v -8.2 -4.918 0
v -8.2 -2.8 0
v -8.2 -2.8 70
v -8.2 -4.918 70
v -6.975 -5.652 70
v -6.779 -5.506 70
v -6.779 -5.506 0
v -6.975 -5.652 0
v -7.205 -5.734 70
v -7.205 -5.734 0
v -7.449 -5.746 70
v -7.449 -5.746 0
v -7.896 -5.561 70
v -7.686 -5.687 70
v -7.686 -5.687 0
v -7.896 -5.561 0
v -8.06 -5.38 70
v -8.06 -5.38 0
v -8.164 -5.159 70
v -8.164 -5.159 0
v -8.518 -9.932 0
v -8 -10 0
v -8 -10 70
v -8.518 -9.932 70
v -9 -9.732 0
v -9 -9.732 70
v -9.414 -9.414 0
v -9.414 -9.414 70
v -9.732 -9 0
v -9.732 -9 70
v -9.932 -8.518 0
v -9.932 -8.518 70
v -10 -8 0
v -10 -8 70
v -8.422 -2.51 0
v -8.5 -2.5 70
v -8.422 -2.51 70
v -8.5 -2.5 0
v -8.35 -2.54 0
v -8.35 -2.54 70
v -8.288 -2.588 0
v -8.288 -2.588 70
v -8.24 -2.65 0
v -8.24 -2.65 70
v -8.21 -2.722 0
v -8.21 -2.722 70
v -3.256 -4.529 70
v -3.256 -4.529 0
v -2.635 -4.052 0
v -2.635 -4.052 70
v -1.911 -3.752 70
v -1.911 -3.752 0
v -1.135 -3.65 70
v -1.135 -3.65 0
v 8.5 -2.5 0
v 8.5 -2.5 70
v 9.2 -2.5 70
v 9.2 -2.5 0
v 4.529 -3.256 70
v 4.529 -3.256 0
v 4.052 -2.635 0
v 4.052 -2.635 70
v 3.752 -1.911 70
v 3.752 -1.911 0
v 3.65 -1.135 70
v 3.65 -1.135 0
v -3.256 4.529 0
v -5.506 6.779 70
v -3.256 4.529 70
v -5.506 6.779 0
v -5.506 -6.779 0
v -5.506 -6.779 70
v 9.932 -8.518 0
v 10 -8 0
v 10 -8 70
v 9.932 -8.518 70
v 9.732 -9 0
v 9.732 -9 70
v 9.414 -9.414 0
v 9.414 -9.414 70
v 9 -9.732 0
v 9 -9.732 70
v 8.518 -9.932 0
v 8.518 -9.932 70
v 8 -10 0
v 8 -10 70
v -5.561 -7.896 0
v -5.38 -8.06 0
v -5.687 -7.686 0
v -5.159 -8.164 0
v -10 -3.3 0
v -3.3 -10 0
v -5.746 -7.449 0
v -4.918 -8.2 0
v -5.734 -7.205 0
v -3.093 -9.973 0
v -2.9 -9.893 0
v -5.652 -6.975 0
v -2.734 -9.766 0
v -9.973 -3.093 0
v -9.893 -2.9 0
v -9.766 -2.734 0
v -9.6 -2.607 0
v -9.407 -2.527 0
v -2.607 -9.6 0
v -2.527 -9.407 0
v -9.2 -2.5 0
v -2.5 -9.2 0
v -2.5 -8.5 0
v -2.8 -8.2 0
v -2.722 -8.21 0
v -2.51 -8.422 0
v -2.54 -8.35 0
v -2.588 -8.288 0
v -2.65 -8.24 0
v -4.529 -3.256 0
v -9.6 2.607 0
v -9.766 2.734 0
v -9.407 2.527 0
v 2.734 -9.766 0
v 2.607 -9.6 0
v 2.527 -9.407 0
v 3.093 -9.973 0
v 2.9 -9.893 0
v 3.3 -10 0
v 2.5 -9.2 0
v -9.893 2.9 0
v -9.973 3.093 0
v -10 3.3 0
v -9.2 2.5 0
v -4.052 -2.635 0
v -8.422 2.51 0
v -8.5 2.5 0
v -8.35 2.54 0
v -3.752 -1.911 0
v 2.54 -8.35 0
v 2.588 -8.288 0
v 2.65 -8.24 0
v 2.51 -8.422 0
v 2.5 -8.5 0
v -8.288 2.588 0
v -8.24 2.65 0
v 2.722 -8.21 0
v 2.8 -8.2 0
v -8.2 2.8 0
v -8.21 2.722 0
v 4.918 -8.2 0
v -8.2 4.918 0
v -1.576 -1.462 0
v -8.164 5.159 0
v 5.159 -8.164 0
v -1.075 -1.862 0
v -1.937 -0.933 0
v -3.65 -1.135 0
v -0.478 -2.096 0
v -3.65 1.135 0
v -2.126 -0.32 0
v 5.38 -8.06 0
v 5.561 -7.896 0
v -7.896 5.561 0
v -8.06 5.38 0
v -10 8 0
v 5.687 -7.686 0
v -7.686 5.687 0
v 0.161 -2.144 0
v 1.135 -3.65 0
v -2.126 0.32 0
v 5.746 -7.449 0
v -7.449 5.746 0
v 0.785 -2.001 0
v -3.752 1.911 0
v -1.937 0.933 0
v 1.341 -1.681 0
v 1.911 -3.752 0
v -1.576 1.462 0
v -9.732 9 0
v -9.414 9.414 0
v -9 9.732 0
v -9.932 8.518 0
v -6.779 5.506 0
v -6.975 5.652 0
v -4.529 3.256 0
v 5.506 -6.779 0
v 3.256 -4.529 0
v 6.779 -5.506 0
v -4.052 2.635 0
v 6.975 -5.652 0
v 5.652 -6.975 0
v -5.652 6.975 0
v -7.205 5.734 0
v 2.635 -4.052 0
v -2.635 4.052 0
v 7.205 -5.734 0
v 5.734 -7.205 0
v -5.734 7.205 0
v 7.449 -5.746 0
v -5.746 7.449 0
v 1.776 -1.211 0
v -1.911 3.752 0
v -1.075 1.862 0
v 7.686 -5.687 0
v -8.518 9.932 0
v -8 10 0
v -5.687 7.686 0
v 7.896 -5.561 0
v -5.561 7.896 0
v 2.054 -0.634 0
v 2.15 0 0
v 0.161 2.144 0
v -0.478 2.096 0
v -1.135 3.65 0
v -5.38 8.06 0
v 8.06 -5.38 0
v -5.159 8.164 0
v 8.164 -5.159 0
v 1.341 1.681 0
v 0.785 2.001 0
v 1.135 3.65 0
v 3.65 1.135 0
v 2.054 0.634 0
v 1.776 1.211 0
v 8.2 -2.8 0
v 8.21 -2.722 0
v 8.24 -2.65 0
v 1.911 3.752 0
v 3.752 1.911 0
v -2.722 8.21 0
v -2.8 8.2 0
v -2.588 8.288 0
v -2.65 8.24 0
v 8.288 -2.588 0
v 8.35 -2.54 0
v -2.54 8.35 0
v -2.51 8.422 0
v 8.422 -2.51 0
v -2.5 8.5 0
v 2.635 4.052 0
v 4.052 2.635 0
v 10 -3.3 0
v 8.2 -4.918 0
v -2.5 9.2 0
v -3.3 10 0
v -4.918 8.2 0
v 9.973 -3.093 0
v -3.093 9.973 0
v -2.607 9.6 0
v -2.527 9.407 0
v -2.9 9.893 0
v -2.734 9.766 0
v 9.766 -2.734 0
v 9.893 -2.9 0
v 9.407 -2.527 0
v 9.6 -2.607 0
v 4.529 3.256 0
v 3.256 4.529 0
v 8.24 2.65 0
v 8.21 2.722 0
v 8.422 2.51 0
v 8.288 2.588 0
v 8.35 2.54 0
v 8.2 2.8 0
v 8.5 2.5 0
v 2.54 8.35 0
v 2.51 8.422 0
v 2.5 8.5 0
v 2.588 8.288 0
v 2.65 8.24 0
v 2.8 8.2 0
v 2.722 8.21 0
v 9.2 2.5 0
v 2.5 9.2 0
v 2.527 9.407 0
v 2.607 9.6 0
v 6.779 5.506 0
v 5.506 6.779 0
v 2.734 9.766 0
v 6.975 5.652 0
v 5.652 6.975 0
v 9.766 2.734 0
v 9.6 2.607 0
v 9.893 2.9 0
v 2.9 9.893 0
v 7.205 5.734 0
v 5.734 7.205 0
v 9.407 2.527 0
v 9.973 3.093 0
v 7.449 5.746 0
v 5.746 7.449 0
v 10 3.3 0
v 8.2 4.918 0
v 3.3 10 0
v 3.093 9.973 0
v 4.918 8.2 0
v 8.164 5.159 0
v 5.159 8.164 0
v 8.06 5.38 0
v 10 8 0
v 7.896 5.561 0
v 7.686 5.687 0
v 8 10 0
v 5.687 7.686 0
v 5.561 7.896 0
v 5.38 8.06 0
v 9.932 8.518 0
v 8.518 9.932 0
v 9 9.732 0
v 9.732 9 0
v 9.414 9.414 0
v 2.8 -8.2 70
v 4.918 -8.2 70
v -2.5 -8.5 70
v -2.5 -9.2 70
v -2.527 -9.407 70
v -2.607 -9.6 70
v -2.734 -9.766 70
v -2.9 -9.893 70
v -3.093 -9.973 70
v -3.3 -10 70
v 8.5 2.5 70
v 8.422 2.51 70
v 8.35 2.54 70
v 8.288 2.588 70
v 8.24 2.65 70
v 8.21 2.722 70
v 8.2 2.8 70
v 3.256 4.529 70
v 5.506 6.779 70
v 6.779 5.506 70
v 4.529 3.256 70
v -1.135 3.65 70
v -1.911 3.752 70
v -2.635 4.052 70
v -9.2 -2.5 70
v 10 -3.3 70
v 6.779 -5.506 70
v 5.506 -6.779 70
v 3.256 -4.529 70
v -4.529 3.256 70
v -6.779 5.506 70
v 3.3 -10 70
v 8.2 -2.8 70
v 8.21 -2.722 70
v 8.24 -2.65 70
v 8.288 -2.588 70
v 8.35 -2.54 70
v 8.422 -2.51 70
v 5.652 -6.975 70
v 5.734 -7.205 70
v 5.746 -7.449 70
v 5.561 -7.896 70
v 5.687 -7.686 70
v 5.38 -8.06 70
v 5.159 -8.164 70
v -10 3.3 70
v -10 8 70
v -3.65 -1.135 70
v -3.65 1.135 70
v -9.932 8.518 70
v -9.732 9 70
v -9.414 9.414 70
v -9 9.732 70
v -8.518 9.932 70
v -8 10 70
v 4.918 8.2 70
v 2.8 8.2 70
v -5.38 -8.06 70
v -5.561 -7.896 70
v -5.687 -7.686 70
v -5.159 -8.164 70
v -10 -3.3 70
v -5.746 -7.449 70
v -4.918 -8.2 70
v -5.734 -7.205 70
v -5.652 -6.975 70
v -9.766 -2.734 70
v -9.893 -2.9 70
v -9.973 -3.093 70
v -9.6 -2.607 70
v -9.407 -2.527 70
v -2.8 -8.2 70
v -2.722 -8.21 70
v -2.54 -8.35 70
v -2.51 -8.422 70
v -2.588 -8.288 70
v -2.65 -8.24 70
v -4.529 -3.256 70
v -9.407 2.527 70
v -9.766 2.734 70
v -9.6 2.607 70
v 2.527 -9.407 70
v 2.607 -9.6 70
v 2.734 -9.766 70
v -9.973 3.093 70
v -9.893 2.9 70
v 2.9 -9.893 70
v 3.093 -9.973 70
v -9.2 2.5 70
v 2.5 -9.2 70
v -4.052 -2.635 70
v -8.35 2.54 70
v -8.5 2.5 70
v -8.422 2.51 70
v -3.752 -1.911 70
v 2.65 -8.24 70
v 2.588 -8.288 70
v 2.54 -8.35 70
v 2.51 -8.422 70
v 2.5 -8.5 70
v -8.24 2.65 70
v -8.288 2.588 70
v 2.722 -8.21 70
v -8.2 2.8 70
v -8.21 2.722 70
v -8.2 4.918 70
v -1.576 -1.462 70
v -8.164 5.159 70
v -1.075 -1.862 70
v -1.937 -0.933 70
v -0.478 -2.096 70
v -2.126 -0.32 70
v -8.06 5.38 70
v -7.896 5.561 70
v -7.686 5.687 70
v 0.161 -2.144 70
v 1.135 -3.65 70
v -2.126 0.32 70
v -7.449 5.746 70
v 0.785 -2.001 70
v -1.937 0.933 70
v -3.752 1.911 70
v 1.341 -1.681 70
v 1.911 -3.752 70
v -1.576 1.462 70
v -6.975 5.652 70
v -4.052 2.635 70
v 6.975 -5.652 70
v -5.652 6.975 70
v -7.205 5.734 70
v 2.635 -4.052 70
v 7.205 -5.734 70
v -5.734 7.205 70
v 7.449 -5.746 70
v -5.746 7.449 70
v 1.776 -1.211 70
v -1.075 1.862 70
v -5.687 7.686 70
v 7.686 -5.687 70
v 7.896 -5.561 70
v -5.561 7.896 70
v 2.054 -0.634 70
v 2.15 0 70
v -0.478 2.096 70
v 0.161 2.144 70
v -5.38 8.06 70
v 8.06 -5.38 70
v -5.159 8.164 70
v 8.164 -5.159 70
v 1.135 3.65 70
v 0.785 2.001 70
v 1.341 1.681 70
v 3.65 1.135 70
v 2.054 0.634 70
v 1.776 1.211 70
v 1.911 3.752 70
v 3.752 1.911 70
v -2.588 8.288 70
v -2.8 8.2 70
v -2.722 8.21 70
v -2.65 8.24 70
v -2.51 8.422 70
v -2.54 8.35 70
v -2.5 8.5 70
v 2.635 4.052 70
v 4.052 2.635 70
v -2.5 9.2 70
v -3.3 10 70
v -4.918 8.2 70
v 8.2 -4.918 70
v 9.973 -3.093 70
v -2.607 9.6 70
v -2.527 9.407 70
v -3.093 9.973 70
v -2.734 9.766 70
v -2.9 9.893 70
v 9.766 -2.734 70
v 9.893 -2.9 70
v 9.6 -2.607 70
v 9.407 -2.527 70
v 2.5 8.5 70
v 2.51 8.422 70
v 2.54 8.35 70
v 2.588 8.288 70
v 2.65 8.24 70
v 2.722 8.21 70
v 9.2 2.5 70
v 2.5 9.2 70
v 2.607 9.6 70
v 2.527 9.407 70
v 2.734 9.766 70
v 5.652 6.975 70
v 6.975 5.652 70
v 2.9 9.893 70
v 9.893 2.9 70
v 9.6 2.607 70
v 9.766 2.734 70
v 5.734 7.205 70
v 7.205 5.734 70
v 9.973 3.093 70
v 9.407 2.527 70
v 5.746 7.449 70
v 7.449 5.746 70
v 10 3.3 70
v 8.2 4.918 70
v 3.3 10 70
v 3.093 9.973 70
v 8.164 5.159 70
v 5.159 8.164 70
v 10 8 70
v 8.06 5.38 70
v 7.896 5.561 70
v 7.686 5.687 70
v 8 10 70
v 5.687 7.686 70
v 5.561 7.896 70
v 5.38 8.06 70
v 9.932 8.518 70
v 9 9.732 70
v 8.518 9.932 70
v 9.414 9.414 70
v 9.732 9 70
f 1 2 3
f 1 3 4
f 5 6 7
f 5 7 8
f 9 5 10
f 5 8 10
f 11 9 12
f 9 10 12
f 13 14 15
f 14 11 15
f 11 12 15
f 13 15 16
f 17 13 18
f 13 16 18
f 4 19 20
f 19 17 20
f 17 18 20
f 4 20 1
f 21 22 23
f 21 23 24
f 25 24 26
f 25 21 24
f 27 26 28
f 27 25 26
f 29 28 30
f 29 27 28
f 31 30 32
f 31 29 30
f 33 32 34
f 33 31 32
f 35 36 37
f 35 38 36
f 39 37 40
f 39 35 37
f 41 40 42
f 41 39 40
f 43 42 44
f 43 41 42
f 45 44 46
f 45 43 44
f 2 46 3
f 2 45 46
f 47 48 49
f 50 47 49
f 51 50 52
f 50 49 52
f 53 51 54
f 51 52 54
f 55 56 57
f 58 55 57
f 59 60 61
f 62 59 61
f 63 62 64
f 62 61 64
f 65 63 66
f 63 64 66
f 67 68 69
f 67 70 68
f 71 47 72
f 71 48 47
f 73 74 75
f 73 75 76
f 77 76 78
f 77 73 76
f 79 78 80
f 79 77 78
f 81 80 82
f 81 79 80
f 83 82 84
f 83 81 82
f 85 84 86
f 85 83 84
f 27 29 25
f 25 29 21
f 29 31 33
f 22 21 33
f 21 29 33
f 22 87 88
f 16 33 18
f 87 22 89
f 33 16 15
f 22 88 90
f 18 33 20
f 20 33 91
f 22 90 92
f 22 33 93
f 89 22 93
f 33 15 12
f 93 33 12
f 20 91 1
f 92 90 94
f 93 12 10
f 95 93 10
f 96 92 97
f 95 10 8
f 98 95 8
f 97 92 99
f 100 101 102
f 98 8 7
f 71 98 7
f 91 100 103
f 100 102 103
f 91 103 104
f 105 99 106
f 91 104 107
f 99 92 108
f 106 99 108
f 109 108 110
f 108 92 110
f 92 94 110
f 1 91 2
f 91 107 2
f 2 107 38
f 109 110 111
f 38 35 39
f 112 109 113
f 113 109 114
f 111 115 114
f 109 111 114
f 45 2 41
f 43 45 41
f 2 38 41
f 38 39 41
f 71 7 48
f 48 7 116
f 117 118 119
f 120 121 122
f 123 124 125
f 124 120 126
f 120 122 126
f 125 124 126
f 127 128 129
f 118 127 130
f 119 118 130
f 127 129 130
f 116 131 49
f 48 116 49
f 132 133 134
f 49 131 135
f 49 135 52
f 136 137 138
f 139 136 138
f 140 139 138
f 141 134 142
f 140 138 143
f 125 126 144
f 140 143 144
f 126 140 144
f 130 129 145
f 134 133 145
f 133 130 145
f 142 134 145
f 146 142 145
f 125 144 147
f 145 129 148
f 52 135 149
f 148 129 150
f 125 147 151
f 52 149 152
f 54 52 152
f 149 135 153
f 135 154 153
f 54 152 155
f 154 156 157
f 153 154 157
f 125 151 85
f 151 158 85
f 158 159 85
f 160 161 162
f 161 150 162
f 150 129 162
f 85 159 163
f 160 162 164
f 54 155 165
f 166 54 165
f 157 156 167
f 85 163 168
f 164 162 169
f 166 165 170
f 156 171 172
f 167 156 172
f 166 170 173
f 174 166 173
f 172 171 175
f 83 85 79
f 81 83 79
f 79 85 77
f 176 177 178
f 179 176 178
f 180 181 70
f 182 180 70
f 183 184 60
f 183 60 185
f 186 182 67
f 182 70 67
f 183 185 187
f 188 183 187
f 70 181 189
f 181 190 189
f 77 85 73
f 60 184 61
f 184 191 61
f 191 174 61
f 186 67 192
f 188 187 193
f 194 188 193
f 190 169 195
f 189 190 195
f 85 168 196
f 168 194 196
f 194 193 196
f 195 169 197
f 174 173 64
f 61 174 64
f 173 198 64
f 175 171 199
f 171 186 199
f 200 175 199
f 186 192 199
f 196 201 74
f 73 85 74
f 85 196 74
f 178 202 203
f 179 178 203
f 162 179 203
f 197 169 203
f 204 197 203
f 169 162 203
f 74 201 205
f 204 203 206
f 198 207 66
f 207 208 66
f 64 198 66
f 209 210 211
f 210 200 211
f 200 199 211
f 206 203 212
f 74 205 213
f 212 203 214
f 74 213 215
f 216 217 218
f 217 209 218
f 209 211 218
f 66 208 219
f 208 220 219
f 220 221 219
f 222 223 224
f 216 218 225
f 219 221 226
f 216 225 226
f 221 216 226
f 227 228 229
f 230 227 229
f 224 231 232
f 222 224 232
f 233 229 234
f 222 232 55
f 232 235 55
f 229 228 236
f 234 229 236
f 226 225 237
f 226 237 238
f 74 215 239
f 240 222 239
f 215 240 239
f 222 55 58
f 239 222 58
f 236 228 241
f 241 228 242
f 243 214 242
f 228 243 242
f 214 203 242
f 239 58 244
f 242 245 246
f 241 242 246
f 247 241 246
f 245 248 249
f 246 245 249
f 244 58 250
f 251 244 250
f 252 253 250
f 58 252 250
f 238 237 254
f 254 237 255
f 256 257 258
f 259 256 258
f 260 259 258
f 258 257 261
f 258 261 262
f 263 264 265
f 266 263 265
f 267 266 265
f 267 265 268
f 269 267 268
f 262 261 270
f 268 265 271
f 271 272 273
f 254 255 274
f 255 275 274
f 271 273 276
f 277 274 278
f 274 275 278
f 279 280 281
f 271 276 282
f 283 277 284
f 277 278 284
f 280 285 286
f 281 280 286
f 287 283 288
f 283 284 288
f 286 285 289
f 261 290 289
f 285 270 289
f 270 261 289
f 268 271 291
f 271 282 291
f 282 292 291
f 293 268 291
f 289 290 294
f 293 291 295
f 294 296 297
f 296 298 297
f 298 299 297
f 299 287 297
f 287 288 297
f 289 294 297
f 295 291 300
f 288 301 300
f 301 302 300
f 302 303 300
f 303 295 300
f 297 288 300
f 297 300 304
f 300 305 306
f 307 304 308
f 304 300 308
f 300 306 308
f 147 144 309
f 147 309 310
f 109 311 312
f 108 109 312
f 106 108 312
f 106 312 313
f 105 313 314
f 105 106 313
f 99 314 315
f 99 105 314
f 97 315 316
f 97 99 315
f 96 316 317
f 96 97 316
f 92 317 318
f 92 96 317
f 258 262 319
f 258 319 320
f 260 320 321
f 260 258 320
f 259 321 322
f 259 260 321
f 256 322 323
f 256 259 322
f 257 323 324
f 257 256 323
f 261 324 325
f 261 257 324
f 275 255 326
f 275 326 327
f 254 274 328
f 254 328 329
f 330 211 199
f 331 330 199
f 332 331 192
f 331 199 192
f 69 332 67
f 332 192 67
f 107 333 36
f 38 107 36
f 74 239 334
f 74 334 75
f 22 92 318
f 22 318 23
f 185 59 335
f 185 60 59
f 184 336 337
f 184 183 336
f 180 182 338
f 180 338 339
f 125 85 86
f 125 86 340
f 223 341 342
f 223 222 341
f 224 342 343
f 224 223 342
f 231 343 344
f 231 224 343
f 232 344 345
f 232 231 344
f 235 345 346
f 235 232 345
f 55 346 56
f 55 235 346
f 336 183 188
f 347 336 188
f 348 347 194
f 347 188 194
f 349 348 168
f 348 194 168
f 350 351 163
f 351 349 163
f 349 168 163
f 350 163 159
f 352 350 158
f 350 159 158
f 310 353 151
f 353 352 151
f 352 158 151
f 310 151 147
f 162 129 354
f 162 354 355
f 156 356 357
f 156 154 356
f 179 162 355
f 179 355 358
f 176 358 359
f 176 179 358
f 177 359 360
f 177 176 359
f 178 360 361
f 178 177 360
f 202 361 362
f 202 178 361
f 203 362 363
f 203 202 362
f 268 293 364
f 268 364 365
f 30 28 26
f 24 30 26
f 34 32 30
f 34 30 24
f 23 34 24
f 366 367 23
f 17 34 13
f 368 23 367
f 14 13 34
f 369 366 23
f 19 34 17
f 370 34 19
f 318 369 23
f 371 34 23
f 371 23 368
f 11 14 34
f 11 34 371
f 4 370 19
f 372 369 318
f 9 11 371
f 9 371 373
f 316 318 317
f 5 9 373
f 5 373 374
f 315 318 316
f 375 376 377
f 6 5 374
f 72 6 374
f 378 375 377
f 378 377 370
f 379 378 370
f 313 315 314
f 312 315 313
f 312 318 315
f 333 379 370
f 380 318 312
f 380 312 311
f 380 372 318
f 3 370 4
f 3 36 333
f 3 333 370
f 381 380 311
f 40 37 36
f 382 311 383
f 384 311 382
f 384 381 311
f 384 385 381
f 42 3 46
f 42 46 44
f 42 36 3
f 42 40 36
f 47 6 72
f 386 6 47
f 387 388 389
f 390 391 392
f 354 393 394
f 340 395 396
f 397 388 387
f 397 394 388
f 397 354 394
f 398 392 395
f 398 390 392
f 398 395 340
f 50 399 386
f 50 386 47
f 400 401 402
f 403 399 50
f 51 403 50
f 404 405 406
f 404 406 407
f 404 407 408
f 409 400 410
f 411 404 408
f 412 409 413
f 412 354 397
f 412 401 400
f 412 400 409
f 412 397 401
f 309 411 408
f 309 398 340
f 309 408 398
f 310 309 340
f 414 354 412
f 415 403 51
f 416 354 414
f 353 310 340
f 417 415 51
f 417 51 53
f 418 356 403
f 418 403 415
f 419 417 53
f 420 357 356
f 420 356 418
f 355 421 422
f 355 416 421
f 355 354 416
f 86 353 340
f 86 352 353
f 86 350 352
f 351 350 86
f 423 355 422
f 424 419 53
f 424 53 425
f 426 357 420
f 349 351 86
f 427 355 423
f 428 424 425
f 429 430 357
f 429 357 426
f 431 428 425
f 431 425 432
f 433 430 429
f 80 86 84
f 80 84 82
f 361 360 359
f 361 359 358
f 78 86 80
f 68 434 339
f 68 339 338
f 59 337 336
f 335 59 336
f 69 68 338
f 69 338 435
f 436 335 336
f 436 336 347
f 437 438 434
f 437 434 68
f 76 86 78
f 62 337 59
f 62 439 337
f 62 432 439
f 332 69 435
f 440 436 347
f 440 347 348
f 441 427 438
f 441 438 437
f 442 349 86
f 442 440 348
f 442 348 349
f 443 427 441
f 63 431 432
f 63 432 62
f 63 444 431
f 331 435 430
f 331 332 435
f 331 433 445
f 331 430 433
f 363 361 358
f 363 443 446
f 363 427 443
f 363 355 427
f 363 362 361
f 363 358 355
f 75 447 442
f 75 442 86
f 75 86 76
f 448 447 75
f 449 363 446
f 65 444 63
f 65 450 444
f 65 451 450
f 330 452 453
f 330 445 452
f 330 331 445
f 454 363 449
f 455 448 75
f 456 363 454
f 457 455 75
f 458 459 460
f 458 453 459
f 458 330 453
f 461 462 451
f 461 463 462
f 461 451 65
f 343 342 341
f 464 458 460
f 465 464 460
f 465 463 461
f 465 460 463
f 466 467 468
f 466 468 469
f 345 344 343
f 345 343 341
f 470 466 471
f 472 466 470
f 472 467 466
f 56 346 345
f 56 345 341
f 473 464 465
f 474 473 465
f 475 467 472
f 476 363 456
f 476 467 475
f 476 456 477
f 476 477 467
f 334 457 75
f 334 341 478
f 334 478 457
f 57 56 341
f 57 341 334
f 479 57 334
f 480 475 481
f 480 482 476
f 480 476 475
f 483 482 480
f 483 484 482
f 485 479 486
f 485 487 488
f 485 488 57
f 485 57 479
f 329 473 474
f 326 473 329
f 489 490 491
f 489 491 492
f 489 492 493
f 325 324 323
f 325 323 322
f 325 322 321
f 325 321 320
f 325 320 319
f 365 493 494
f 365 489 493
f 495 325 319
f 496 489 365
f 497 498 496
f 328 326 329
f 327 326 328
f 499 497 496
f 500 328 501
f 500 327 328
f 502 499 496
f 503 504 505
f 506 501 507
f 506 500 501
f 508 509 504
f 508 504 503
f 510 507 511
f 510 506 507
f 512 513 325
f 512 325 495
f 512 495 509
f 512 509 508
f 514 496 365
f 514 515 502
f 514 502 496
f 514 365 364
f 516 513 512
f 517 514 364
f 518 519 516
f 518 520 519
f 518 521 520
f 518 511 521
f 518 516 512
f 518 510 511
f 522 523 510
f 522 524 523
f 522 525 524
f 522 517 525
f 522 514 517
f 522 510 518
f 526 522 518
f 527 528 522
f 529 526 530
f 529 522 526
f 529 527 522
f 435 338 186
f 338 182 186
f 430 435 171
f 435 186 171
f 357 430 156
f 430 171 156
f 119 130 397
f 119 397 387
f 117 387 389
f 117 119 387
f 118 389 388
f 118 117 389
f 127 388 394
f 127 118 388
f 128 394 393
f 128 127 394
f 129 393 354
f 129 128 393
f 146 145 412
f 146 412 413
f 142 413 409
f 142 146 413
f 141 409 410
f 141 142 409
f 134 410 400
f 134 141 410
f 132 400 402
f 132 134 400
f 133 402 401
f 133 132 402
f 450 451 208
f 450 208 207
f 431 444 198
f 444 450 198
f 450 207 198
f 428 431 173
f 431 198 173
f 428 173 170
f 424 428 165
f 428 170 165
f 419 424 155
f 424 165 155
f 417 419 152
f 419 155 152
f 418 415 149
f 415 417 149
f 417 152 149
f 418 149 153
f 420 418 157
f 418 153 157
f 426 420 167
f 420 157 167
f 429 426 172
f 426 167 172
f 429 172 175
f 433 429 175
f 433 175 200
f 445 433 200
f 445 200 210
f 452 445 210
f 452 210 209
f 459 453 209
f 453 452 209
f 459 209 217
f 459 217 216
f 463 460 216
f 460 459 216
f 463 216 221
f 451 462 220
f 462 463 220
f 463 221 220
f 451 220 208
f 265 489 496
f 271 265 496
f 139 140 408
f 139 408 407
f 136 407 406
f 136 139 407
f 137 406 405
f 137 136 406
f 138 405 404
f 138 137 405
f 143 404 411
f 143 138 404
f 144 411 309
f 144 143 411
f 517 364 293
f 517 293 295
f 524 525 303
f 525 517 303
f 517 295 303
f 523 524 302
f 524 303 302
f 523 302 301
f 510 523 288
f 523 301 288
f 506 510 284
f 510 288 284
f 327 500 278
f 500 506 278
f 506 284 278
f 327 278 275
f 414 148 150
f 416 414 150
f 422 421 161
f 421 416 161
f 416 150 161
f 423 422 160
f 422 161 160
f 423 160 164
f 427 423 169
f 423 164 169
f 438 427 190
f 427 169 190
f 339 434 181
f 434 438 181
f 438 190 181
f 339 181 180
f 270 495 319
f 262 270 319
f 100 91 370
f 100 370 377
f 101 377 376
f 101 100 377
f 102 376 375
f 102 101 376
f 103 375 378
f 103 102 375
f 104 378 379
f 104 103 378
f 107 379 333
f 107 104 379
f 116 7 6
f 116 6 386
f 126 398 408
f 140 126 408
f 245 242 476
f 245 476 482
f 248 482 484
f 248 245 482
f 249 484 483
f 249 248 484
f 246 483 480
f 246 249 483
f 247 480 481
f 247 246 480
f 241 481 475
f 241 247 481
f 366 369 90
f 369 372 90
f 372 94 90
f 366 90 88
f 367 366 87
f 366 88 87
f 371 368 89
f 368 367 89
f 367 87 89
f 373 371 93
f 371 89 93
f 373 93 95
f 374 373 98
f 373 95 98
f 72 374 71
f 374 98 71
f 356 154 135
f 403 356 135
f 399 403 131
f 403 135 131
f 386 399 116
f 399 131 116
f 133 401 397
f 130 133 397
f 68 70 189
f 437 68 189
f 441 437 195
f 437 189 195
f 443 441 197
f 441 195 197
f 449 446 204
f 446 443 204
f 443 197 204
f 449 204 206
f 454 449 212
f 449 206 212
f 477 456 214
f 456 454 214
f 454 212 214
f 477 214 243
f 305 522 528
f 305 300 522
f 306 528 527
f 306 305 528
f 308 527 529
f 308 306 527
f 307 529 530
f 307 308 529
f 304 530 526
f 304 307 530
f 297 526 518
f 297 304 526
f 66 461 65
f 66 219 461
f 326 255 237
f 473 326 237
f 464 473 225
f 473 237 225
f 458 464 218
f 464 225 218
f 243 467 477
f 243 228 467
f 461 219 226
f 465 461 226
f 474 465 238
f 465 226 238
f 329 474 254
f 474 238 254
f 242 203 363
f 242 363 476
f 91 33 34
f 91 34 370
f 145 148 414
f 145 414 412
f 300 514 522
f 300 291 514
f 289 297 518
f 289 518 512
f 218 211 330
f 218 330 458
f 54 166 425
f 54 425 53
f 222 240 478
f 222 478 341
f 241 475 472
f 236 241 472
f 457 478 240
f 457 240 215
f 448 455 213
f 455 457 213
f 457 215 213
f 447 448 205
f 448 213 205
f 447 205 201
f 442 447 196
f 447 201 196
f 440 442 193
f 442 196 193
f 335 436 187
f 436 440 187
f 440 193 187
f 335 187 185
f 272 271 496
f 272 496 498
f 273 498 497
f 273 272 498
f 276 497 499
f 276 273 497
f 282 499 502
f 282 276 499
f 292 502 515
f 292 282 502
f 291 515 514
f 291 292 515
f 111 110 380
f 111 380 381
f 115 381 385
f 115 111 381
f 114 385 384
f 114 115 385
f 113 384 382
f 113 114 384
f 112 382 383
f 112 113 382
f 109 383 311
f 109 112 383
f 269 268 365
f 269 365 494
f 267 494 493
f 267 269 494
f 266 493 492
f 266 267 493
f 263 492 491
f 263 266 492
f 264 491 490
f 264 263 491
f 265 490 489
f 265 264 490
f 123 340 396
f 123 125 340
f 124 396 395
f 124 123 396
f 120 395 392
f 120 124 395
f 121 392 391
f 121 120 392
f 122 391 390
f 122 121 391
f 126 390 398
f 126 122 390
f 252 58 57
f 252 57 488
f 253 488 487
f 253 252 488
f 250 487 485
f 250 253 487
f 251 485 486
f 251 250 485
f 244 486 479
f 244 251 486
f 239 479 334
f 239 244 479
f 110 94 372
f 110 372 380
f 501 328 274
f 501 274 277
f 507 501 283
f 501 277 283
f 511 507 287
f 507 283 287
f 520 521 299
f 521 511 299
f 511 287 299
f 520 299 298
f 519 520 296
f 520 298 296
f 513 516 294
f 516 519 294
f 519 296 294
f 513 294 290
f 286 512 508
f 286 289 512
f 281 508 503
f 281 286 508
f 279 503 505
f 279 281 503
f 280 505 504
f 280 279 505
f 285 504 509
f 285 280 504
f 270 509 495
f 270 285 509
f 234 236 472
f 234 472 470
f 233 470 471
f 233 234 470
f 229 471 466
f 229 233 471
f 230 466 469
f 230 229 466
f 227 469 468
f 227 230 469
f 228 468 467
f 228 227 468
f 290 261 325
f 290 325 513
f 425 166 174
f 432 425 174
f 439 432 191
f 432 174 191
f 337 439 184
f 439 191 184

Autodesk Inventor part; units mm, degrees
ref_plane "YZ Plane" through (0, 0, 0) normal (1, 0, 0) x (0, 1, 0)
ref_plane "Startebene" through (0, 0, 0) normal (0, 0, 1) x (1, 0, 0)
ref_plane "Endebene" through (0, 0, 70) normal (0, 0, 1) x (1, 0, 0)
sketch "Skizze" plane through (0, 0, 0) normal (0, 0, 1) x (1, 0, 0)
  arc A0 (-4.5287, -3.2559) -> (-3.65, -1.1346) centre (-6.65, -1.1346) ccw
  line L0 (-3.65, -1.1346) -> (-3.65, 1.1346)
  circle A1 centre (0, 0) radius 2.15
  line L1 (1.1346, -3.65) -> (-1.1346, -3.65)
  arc A2 (-1.1346, -3.65) -> (-3.2559, -4.5287) centre (-1.1346, -6.65) ccw
  line L2 (-6.779, -5.5062) -> (-4.5287, -3.2559)
  line L3 (-3.2559, -4.5287) -> (-5.5062, -6.779)
  arc A3 (-2.5, -8.5) -> (-2.8, -8.2) centre (-2.8, -8.5) ccw
  line L4 (-2.5, -8.5) -> (-2.5, -9.2)
  line L5 (-4.9176, -8.2) -> (-2.8, -8.2)
  arc A4 (-5.5062, -6.779) -> (-4.9176, -8.2) centre (-4.9176, -7.3676) ccw
  arc A5 (-3.3, -10) -> (-2.5, -9.2) centre (-3.3, -9.2) ccw
  line L6 (-3.3, -10) -> (-8, -10)
  line L7 (10, -3.3) -> (10, -8)
  line L8 (5.5062, -6.779) -> (3.2559, -4.5287)
  arc A6 (6.779, -5.5062) -> (8.2, -4.9176) centre (7.3676, -4.9176) ccw
  arc A7 (3.2559, -4.5287) -> (1.1346, -3.65) centre (1.1346, -6.65) ccw
  line L9 (4.5287, -3.2559) -> (6.779, -5.5062)
  arc A8 (3.65, -1.1346) -> (4.5287, -3.2559) centre (6.65, -1.1346) ccw
  arc A9 (8.5, -2.5) -> (8.2, -2.8) centre (8.5, -2.8) ccw
  line L10 (3.65, 1.1346) -> (3.65, -1.1346)
  line L11 (8.5, -2.5) -> (9.2, -2.5)
  arc A10 (10, -3.3) -> (9.2, -2.5) centre (9.2, -3.3) ccw
  line L12 (8.2, -4.9176) -> (8.2, -2.8)
  line L13 (2.5, 8.5) -> (2.5, 9.2)
  arc A11 (2.5, 8.5) -> (2.8, 8.2) centre (2.8, 8.5) ccw
  arc A12 (1.1346, 3.65) -> (3.2559, 4.5287) centre (1.1346, 6.65) ccw
  line L14 (-1.1346, 3.65) -> (1.1346, 3.65)
  arc A13 (3.3, 10) -> (2.5, 9.2) centre (3.3, 9.2) ccw
  line L15 (4.9176, 8.2) -> (2.8, 8.2)
  arc A14 (4.5287, 3.2559) -> (3.65, 1.1346) centre (6.65, 1.1346) ccw
  line L16 (3.2559, 4.5287) -> (5.5062, 6.779)
  arc A15 (5.5062, 6.779) -> (4.9176, 8.2) centre (4.9176, 7.3676) ccw
  line L17 (6.779, 5.5062) -> (4.5287, 3.2559)
  line L18 (3.3, 10) -> (8, 10)
  arc A16 (10, 8) -> (8, 10) centre (8, 8) ccw
  line L19 (8.2, 2.8) -> (8.2, 4.9176)
  line L20 (10, 8) -> (10, 3.3)
  arc A17 (8.2, 4.9176) -> (6.779, 5.5062) centre (7.3676, 4.9176) ccw
  line L21 (-2.8, 8.2) -> (-4.9176, 8.2)
  line L22 (-2.5, 9.2) -> (-2.5, 8.5)
  arc A18 (-2.5, 9.2) -> (-3.3, 10) centre (-3.3, 9.2) ccw
  arc A19 (-2.8, 8.2) -> (-2.5, 8.5) centre (-2.8, 8.5) ccw
  arc A20 (-3.65, 1.1346) -> (-4.5287, 3.2559) centre (-6.65, 1.1346) ccw
  arc A21 (-3.2559, 4.5287) -> (-1.1346, 3.65) centre (-1.1346, 6.65) ccw
  arc A22 (4.9176, -8.2) -> (5.5062, -6.779) centre (4.9176, -7.3676) ccw
  arc A23 (8, -10) -> (10, -8) centre (8, -8) ccw
  line L23 (2.8, -8.2) -> (4.9176, -8.2)
  line L24 (8, -10) -> (3.3, -10)
  arc A24 (2.8, -8.2) -> (2.5, -8.5) centre (2.8, -8.5) ccw
  arc A25 (2.5, -9.2) -> (3.3, -10) centre (3.3, -9.2) ccw
  line L25 (2.5, -9.2) -> (2.5, -8.5)
  arc A26 (8.2, 2.8) -> (8.5, 2.5) centre (8.5, 2.8) ccw
  line L26 (9.2, 2.5) -> (8.5, 2.5)
  arc A27 (9.2, 2.5) -> (10, 3.3) centre (9.2, 3.3) ccw
  arc A28 (-4.9176, 8.2) -> (-5.5062, 6.779) centre (-4.9176, 7.3676) ccw
  line L27 (-8, 10) -> (-3.3, 10)
  line L28 (-5.5062, 6.779) -> (-3.2559, 4.5287)
  arc A29 (-8, 10) -> (-10, 8) centre (-8, 8) ccw
  arc A30 (-6.779, 5.5062) -> (-8.2, 4.9176) centre (-7.3676, 4.9176) ccw
  line L29 (-10, 3.3) -> (-10, 8)
  line L30 (-8.2, 4.9176) -> (-8.2, 2.8)
  arc A31 (-8.5, 2.5) -> (-8.2, 2.8) centre (-8.5, 2.8) ccw
  line L31 (-8.5, 2.5) -> (-9.2, 2.5)
  arc A32 (-10, 3.3) -> (-9.2, 2.5) centre (-9.2, 3.3) ccw
  line L32 (-4.5287, 3.2559) -> (-6.779, 5.5062)
  line L33 (-10, -8) -> (-10, -3.3)
  arc A33 (-8.2, -4.9176) -> (-6.779, -5.5062) centre (-7.3676, -4.9176) ccw
  arc A34 (-10, -8) -> (-8, -10) centre (-8, -8) ccw
  line L34 (-10, -8) -> (-10, -3.3)
  arc A35 (-8.2, -2.8) -> (-8.5, -2.5) centre (-8.5, -2.8) ccw
  line L35 (-9.2, -2.5) -> (-8.5, -2.5)
  arc A36 (-9.2, -2.5) -> (-10, -3.3) centre (-9.2, -3.3) ccw
  line L36 (-8.2, -2.8) -> (-8.2, -4.9176)
  dimension "d4" = 4.3
  dimension "d5" = 6.35
  dimension "d6" = 10
  dimension "d7" = 2.5
  dimension "d8" = 5.8
  dimension "d9" = 10.5
  dimension "d10" = 3
  dimension "d11" = 7.5
  dimension "d12" = 12.5
  dimension "d13" = 13.65
  dimension "d14" = 5.7
  dimension "d15" = 10.7
  dimension "d16" = 1.15
  dimension "d17" = 6.15
  dimension "d18" = 1.8
  dimension "d19" = 0.8
  dimension "d20" = 0.3
  dimension "d21" = 2
  dimension "d22" = 0.8324
  dimension "d23" = 45
  dimension "d24" = 90
  dimension "d25" = 90
  dimension "d26" = 1.8
  dimension "d27" = 18.2
  dimension "d28" = 20
  dimension "d29" = 5
  dimension "d30" = 7.5
  dimension "d31" = 1.8
  dimension "d32" = 0.9
  dimension "d33" = 0.9
  dimension "d34" = 20
extrude "Körper" add sketch "Skizze" along normal up to surface (70 mm away) from surface at 0
sketch "Skizze6" plane through (0, 0, 0) normal (0, 0, 1) x (1, 0, 0)
  line L0 (0, 0) -> (10, 0)
ref_plane "Arbeitsebene4" through (0, 0, 0) normal (0, -1, 0) x (1, 0, 0)
sketch "Skizze7" plane through (0, 0, 0) normal (0, -1, 0) x (1, 0, 0)
  line L0 (-2, 0) -> (12, 0)
  line L1 (-2, 70) -> (12, 70)
  dimension "d43" = 70
equation "\"G_OFFSET_START\" = 0"
equation "\"G_OFFSET_END\" = 0"
equation "\"G_L\" = d43"
